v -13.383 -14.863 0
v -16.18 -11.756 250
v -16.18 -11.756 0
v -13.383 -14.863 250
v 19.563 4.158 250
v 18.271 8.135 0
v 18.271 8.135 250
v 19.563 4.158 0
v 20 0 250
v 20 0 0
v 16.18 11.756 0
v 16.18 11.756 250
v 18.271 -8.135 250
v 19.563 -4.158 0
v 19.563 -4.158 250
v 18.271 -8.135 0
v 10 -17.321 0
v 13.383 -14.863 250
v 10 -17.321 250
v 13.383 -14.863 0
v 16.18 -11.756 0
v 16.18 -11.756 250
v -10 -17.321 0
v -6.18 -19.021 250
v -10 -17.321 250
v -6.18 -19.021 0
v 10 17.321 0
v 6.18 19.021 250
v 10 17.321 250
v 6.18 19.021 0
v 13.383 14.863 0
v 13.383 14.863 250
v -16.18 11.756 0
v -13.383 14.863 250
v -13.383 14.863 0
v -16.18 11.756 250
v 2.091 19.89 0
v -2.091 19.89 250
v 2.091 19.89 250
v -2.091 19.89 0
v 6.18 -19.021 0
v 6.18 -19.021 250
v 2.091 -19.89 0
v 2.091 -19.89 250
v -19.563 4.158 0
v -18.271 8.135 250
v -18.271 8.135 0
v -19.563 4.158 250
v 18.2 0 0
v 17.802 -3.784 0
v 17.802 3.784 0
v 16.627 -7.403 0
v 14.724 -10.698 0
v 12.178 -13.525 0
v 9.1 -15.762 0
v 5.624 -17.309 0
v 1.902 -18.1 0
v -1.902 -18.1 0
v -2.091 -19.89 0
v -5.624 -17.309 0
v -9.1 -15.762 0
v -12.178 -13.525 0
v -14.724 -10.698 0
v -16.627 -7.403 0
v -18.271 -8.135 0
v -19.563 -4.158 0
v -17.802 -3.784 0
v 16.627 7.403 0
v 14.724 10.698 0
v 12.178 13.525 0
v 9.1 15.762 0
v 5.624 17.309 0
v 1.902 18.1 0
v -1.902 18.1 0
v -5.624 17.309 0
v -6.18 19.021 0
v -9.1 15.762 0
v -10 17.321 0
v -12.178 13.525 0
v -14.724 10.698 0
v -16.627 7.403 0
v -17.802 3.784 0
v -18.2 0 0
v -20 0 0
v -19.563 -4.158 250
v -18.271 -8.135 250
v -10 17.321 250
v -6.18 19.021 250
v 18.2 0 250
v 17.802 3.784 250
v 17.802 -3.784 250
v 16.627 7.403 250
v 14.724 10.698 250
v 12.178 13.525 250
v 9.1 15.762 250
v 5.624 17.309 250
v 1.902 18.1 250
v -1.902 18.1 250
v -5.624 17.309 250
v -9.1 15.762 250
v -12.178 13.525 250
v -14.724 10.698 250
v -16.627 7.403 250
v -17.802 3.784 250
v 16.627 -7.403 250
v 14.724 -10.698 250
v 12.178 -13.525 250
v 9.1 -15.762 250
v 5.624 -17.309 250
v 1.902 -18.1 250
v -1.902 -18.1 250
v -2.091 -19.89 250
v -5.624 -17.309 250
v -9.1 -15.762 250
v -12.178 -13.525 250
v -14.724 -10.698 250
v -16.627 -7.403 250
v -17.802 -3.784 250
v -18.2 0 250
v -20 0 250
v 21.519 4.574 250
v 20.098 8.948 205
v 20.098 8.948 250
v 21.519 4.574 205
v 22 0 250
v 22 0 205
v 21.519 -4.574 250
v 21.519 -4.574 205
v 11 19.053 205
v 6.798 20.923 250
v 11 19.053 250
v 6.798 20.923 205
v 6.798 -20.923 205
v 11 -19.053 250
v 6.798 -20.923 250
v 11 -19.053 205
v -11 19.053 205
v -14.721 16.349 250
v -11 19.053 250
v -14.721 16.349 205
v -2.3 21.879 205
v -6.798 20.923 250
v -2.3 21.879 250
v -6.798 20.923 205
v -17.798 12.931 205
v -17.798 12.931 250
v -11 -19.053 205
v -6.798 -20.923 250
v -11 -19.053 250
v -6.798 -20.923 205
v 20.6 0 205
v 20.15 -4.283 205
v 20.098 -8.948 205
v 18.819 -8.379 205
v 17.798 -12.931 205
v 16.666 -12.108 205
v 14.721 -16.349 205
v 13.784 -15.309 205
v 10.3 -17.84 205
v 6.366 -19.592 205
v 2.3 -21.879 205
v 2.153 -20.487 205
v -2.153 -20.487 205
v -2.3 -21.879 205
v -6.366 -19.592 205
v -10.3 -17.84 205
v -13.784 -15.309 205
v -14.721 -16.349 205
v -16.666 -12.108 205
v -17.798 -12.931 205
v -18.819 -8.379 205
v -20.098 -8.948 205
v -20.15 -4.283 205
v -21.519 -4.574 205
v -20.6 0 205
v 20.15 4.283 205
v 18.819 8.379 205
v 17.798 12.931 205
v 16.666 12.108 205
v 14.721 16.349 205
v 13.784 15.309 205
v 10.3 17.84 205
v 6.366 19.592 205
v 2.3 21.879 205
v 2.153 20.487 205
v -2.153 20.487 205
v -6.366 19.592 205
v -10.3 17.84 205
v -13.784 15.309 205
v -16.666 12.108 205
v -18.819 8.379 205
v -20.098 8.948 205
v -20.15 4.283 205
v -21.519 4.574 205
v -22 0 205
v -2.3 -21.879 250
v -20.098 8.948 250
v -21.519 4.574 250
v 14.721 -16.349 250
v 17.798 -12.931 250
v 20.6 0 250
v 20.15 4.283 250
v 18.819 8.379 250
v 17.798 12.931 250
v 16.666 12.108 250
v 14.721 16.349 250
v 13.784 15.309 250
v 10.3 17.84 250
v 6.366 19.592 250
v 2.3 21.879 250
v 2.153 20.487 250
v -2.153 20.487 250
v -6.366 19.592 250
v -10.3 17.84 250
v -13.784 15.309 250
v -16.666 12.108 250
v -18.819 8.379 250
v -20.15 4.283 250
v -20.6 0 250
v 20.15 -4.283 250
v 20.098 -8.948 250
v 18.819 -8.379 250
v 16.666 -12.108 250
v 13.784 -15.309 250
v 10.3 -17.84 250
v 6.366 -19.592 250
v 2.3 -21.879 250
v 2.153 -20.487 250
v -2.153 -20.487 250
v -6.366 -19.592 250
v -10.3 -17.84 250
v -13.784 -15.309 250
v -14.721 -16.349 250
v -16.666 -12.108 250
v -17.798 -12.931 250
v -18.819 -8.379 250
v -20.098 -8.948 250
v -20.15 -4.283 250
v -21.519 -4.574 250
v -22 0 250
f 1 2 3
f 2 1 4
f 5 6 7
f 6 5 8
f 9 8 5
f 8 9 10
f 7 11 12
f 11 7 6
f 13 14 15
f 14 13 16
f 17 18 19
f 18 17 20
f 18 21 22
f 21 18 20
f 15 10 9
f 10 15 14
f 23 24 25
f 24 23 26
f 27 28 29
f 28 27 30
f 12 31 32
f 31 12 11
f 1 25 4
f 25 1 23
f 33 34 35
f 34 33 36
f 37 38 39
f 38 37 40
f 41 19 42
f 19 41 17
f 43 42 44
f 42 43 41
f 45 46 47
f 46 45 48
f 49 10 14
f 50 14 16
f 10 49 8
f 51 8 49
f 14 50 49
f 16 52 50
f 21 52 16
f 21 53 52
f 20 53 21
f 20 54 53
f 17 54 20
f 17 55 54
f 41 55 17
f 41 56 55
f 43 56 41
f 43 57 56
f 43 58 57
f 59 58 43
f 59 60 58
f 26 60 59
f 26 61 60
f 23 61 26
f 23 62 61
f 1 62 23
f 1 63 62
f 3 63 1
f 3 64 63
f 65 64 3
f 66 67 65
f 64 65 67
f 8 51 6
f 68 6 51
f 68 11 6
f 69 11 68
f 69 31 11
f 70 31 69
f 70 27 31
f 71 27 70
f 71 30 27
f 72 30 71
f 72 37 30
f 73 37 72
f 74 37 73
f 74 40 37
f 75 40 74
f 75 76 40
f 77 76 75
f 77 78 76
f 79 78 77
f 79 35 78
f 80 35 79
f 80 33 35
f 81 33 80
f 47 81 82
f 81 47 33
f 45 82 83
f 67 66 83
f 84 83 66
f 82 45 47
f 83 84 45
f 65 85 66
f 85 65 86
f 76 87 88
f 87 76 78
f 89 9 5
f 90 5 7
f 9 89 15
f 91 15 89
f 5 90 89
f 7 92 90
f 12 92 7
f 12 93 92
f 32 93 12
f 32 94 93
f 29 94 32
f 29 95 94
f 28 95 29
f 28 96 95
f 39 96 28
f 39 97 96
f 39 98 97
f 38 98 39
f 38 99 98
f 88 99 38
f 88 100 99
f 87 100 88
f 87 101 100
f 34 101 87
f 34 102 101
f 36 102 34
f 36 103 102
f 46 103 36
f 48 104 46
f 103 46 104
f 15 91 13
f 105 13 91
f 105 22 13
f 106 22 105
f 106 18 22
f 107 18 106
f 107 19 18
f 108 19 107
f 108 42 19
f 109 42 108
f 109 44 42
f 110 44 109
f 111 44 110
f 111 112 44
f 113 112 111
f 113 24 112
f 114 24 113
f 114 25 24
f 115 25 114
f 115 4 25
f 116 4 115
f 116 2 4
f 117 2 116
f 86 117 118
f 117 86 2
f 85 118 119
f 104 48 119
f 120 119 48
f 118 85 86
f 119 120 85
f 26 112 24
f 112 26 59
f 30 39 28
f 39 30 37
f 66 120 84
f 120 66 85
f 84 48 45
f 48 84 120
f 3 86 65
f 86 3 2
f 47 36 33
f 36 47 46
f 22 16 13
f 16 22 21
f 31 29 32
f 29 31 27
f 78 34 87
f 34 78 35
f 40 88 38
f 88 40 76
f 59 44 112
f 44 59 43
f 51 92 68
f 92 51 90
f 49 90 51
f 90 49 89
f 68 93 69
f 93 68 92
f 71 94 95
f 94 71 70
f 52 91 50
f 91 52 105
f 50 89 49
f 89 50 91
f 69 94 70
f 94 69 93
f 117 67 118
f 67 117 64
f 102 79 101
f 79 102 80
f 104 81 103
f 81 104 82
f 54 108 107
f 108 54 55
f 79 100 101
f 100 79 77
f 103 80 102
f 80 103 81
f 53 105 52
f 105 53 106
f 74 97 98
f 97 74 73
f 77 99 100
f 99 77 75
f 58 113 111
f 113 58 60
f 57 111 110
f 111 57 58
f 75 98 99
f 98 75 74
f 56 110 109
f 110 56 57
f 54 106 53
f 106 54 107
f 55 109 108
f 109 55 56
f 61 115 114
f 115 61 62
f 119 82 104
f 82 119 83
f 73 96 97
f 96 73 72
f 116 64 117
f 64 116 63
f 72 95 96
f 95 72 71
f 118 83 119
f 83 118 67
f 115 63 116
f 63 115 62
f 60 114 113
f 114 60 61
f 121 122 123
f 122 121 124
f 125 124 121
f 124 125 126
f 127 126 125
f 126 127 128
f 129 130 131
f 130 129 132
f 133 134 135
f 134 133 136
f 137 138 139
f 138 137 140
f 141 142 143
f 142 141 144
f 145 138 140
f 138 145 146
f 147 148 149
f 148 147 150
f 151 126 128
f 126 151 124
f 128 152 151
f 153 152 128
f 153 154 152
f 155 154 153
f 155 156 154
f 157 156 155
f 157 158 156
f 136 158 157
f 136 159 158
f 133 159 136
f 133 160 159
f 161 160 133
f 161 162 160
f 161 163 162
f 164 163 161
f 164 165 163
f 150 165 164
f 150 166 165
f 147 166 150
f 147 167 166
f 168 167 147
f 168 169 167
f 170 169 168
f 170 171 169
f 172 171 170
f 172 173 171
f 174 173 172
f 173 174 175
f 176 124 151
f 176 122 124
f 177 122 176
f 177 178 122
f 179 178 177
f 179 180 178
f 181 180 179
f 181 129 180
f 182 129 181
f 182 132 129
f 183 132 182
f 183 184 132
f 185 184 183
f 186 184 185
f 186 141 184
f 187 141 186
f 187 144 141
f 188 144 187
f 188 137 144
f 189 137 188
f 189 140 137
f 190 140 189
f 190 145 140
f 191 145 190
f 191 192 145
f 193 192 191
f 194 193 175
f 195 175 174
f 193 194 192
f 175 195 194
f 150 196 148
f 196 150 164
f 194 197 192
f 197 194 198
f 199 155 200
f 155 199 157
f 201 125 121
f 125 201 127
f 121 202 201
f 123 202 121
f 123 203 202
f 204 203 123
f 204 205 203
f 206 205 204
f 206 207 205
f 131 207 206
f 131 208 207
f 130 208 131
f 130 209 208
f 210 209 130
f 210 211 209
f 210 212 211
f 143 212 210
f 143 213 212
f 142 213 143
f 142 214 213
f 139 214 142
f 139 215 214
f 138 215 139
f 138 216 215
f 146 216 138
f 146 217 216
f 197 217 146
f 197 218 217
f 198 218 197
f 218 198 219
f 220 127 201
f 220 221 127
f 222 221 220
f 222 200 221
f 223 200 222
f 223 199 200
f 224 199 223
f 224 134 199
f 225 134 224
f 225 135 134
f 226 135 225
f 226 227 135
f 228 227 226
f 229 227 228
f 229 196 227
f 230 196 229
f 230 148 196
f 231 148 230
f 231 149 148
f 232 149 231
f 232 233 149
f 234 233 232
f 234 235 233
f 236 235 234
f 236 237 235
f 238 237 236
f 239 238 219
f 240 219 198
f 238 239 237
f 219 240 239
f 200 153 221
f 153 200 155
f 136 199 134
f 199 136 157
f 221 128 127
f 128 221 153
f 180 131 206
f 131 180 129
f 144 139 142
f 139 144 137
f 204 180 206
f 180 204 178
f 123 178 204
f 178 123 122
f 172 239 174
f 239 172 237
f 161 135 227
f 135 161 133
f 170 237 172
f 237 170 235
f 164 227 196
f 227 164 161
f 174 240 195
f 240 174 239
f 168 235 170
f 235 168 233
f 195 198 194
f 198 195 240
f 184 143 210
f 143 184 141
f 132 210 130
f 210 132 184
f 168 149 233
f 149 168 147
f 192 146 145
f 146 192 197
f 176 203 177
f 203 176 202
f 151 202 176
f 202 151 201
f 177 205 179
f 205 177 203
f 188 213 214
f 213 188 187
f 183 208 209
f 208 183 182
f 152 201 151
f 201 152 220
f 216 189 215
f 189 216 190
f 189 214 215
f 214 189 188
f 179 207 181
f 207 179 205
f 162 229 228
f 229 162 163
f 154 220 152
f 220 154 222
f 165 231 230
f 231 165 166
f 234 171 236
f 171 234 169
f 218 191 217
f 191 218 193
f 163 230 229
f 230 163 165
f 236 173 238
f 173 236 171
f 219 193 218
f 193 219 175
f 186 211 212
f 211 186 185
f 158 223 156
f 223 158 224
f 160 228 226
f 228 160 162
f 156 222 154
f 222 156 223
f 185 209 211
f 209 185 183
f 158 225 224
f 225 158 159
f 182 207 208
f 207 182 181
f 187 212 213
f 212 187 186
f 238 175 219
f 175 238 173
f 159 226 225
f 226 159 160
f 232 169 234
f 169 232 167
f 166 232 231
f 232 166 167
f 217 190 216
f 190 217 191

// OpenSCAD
// Parameters
pipe_standard = 1; //[1:1:1]
nominal_size = 40; //[20:80:1]
length_mm = 250; //[125:500:1]
pipe_od = 40; //[30:80:0.5]
pipe_wall = 1.8; //[1:4:0.1]
fitting_length = 45; //[25:90:1]
fitting_wall_extra = 1.2; //[0.5:3:0.1]
fitting_od_extra = 4; //[2:10:0.5]
socket_clearance = 0.6; //[0.2:1.5:0.1]
overlap = 1; //[0.5:2:0.1]

// Module for the HT Pipe
module ht_pipe() {
  color([0.85, 0.85, 0.8]) { // PVC color
    union() {
      // Main pipe segment
      difference() {
        cylinder(h=length_mm, r=pipe_od/2, center=false);
        translate([0, 0, -overlap])
          cylinder(h=length_mm + 2*overlap, r=pipe_od/2 - pipe_wall, center=false);
      }
      
      // End fitting
      difference() {
        translate([0, 0, length_mm - fitting_length])
          cylinder(h=fitting_length, r=pipe_od/2 + fitting_od_extra/2, center=false);
        translate([0, 0, length_mm - fitting_length - overlap])
          cylinder(h=fitting_length + overlap, r=pipe_od/2 + socket_clearance, center=false);
      }
    }
  }
}

// Assembly
module assembly() {
  ht_pipe();
}

assembly();
